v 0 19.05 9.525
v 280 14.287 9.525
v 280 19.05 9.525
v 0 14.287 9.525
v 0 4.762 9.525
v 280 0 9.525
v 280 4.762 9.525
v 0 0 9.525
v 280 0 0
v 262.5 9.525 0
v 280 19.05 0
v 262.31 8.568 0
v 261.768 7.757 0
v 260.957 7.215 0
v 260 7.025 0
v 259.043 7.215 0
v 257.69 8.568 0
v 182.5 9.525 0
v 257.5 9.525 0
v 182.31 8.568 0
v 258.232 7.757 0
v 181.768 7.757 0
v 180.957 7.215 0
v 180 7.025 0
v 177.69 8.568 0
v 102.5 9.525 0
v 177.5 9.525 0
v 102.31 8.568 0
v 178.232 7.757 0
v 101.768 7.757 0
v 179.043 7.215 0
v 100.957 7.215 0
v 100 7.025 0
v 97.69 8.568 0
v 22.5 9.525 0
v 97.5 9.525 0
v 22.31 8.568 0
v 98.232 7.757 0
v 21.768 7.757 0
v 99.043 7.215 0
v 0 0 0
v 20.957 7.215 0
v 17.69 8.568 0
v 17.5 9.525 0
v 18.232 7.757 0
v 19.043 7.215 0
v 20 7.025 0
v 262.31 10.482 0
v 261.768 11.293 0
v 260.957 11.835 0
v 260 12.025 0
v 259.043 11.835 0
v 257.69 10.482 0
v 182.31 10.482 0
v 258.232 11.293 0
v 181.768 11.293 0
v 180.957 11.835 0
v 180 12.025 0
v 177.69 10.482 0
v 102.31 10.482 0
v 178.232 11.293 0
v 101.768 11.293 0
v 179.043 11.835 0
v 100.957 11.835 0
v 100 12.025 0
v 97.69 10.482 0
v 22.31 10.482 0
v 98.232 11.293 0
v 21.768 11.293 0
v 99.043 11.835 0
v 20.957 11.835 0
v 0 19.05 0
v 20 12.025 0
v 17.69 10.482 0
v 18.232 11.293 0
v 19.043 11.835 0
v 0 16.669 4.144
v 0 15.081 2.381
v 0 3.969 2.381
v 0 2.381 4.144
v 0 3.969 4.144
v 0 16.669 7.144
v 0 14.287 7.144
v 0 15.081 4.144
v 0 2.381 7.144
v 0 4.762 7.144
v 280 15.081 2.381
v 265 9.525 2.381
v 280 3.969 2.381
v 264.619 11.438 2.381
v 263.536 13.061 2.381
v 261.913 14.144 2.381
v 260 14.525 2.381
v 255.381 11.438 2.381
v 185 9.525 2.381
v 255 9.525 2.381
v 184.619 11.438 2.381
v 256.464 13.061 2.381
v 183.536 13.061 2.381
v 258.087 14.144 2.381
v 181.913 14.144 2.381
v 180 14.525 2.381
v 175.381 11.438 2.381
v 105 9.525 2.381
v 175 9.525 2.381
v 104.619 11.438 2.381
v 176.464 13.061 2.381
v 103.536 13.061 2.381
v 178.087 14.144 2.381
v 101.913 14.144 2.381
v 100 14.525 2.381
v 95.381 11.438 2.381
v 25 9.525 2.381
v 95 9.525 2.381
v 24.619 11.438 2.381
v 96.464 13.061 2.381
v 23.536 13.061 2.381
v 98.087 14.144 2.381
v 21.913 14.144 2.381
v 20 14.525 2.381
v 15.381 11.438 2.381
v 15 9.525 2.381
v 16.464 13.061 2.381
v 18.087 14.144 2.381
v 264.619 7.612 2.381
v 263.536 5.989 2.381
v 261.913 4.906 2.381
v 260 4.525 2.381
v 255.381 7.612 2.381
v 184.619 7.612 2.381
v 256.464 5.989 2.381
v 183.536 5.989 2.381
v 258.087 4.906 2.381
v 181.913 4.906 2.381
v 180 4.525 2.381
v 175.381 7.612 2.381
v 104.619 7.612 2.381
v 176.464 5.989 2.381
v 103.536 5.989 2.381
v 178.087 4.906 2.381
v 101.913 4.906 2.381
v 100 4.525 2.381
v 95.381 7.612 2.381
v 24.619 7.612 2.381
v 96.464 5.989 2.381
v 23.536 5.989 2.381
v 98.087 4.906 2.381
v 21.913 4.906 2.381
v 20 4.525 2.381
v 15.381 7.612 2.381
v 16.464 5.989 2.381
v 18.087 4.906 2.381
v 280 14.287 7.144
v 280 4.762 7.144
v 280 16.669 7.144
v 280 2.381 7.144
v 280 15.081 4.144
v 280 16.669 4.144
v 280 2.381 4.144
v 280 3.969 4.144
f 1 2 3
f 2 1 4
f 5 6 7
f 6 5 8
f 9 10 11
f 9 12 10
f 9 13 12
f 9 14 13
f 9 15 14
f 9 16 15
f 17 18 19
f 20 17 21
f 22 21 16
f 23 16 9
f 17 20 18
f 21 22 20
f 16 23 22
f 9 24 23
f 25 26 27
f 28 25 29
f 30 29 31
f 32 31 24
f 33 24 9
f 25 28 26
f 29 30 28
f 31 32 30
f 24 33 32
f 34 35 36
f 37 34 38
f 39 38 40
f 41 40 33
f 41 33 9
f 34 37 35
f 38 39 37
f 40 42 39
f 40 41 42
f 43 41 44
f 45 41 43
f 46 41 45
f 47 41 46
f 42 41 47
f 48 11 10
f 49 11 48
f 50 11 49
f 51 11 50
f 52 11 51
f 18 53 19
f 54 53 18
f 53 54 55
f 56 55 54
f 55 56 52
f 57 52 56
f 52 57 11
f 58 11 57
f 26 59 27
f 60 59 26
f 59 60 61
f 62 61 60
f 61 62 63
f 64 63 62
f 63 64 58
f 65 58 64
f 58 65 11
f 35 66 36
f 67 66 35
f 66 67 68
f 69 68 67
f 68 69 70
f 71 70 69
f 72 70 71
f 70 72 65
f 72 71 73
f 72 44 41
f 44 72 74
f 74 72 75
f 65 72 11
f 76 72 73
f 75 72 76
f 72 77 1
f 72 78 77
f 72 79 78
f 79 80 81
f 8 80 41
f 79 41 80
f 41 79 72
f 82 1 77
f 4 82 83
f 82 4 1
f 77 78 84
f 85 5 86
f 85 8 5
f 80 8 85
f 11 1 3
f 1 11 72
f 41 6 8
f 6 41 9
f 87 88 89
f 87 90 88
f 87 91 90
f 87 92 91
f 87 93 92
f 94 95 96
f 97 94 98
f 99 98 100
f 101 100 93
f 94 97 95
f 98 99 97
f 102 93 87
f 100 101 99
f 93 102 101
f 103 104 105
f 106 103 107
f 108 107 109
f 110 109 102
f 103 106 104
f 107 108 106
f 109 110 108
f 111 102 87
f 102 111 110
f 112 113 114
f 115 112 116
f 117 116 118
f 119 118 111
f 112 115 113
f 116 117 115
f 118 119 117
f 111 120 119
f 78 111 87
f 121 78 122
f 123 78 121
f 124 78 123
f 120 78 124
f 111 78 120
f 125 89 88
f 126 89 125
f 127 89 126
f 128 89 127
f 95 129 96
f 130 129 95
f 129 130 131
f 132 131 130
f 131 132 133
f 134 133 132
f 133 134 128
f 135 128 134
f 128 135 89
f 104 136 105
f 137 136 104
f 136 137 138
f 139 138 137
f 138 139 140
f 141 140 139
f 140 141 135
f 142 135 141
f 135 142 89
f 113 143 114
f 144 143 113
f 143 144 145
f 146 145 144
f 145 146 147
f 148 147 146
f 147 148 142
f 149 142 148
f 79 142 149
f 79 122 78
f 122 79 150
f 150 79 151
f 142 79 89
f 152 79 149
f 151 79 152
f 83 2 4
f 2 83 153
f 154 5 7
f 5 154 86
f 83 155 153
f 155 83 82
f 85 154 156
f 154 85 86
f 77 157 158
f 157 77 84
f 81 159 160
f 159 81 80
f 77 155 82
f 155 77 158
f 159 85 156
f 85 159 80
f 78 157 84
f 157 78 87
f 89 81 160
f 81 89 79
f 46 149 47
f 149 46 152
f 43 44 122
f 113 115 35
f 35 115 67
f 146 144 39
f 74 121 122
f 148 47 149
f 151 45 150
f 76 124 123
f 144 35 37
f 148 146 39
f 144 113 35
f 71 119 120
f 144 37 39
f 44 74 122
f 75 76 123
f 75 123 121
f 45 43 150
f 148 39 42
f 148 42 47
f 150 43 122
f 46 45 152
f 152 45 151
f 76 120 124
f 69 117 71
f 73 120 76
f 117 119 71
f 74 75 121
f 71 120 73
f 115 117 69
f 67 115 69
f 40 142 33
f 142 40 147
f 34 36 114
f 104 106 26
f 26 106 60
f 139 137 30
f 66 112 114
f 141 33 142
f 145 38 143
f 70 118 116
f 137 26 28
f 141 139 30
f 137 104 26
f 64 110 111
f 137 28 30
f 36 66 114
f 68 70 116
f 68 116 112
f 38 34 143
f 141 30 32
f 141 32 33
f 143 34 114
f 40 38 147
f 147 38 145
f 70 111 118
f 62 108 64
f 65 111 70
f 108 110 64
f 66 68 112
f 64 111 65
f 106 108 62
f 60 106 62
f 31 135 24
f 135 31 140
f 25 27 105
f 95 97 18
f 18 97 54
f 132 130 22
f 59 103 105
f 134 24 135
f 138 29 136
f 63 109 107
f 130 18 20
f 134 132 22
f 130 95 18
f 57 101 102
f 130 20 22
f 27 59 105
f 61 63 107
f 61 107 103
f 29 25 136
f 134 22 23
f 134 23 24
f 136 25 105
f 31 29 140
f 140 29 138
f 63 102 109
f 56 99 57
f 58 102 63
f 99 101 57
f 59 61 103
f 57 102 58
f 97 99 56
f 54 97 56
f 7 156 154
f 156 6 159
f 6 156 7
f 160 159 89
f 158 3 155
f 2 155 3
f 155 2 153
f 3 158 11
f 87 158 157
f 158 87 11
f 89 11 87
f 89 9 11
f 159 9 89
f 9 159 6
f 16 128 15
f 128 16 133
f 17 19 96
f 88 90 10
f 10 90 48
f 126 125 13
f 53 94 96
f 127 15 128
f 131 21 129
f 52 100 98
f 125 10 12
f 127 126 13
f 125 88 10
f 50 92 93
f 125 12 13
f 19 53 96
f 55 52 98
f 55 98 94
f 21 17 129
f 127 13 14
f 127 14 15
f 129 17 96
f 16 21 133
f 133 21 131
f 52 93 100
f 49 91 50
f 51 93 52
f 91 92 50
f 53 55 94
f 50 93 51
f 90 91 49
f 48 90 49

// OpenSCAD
//////////////////////////////
// File: ttrack.scad        //
// Title: T-Track           //
// Version: 1.1.0           //
// Author: Nicholas Feldman //
//////////////////////////////

// Description:
//
// T-Track for woodworking jigs and assembly tables.
// Designed based on Rockler and Powertec tracks.
// 
// I recommend printing on end, using a raft.
// This is the best alignment for most strength possible.
//
// Should be compatible with most T-Bolts,
// But values might need to be tweaked based on how accurate your printer is,
// as well as to account for horizontal expansion. However, I recommend tweaking
// the horizontal expansion value in your slicer instead of adjusting here.

// Version History:
//
// 1.0.0:
//   - Initial Version, create basic t-track profile
// 1.0.1:
//   - Widen countersunk screw hole
// 1.1.0:
//   - Only put holes in every other segment, if odd number of segments

track_height = 9.525;
track_width = 19.05;
track_length = 40;

slot_width = 9.525;
slot_depth = 7.144;

// How far below the surface the "T" is
t_slot_depth = 2.381;
t_slot_width = 14.2875;
t_slot_height = 3;

// I don't know what the point of this phat bottom is but whatever
slot_bottom_width = 11.1125;
slot_bottom_height = slot_depth - t_slot_height - t_slot_depth;

screw_hole_width = 5;
screw_hole_height = track_height - slot_depth;

track_segments = 7;

module ttrack(n, create_screw_hole = true) {
    translate([track_length*(n-1), 0, 0])
    difference() {
        // Main Body of the track
        cube([track_length, track_width, track_height], 0);
        
        // Main slot cutout
        translate([0, (track_width/2)-(slot_width/2), track_height-slot_depth])
        cube([track_length, slot_width, slot_depth], 0);
        
        // Wider "T" cut out
        translate([0, (track_width/2)-(t_slot_width/2), track_height-t_slot_depth-t_slot_height])
        cube([track_length, t_slot_width, t_slot_height],0);
        
        // Bottom expansion cutout
        translate([0, (track_width/2)-(slot_bottom_width/2), track_height-t_slot_depth-t_slot_height - slot_bottom_height])
        cube([track_length, slot_bottom_width, slot_bottom_height], 0);
        
        // Counterunk screw hole
        if (create_screw_hole) {
            translate([track_length/2, track_width/2, 0])
            cylinder(h=screw_hole_height, d1=screw_hole_width, d2=screw_hole_width*2);
        }
   }
}

// Straight t-track
for (i = [1:track_segments]) {
    // If number of segments is even, we put a screw hole in every one.
    // Otherwise we put one in every other segment
    ttrack(i, (track_segments % 2 == 0) || i % 2 != 0);
}
